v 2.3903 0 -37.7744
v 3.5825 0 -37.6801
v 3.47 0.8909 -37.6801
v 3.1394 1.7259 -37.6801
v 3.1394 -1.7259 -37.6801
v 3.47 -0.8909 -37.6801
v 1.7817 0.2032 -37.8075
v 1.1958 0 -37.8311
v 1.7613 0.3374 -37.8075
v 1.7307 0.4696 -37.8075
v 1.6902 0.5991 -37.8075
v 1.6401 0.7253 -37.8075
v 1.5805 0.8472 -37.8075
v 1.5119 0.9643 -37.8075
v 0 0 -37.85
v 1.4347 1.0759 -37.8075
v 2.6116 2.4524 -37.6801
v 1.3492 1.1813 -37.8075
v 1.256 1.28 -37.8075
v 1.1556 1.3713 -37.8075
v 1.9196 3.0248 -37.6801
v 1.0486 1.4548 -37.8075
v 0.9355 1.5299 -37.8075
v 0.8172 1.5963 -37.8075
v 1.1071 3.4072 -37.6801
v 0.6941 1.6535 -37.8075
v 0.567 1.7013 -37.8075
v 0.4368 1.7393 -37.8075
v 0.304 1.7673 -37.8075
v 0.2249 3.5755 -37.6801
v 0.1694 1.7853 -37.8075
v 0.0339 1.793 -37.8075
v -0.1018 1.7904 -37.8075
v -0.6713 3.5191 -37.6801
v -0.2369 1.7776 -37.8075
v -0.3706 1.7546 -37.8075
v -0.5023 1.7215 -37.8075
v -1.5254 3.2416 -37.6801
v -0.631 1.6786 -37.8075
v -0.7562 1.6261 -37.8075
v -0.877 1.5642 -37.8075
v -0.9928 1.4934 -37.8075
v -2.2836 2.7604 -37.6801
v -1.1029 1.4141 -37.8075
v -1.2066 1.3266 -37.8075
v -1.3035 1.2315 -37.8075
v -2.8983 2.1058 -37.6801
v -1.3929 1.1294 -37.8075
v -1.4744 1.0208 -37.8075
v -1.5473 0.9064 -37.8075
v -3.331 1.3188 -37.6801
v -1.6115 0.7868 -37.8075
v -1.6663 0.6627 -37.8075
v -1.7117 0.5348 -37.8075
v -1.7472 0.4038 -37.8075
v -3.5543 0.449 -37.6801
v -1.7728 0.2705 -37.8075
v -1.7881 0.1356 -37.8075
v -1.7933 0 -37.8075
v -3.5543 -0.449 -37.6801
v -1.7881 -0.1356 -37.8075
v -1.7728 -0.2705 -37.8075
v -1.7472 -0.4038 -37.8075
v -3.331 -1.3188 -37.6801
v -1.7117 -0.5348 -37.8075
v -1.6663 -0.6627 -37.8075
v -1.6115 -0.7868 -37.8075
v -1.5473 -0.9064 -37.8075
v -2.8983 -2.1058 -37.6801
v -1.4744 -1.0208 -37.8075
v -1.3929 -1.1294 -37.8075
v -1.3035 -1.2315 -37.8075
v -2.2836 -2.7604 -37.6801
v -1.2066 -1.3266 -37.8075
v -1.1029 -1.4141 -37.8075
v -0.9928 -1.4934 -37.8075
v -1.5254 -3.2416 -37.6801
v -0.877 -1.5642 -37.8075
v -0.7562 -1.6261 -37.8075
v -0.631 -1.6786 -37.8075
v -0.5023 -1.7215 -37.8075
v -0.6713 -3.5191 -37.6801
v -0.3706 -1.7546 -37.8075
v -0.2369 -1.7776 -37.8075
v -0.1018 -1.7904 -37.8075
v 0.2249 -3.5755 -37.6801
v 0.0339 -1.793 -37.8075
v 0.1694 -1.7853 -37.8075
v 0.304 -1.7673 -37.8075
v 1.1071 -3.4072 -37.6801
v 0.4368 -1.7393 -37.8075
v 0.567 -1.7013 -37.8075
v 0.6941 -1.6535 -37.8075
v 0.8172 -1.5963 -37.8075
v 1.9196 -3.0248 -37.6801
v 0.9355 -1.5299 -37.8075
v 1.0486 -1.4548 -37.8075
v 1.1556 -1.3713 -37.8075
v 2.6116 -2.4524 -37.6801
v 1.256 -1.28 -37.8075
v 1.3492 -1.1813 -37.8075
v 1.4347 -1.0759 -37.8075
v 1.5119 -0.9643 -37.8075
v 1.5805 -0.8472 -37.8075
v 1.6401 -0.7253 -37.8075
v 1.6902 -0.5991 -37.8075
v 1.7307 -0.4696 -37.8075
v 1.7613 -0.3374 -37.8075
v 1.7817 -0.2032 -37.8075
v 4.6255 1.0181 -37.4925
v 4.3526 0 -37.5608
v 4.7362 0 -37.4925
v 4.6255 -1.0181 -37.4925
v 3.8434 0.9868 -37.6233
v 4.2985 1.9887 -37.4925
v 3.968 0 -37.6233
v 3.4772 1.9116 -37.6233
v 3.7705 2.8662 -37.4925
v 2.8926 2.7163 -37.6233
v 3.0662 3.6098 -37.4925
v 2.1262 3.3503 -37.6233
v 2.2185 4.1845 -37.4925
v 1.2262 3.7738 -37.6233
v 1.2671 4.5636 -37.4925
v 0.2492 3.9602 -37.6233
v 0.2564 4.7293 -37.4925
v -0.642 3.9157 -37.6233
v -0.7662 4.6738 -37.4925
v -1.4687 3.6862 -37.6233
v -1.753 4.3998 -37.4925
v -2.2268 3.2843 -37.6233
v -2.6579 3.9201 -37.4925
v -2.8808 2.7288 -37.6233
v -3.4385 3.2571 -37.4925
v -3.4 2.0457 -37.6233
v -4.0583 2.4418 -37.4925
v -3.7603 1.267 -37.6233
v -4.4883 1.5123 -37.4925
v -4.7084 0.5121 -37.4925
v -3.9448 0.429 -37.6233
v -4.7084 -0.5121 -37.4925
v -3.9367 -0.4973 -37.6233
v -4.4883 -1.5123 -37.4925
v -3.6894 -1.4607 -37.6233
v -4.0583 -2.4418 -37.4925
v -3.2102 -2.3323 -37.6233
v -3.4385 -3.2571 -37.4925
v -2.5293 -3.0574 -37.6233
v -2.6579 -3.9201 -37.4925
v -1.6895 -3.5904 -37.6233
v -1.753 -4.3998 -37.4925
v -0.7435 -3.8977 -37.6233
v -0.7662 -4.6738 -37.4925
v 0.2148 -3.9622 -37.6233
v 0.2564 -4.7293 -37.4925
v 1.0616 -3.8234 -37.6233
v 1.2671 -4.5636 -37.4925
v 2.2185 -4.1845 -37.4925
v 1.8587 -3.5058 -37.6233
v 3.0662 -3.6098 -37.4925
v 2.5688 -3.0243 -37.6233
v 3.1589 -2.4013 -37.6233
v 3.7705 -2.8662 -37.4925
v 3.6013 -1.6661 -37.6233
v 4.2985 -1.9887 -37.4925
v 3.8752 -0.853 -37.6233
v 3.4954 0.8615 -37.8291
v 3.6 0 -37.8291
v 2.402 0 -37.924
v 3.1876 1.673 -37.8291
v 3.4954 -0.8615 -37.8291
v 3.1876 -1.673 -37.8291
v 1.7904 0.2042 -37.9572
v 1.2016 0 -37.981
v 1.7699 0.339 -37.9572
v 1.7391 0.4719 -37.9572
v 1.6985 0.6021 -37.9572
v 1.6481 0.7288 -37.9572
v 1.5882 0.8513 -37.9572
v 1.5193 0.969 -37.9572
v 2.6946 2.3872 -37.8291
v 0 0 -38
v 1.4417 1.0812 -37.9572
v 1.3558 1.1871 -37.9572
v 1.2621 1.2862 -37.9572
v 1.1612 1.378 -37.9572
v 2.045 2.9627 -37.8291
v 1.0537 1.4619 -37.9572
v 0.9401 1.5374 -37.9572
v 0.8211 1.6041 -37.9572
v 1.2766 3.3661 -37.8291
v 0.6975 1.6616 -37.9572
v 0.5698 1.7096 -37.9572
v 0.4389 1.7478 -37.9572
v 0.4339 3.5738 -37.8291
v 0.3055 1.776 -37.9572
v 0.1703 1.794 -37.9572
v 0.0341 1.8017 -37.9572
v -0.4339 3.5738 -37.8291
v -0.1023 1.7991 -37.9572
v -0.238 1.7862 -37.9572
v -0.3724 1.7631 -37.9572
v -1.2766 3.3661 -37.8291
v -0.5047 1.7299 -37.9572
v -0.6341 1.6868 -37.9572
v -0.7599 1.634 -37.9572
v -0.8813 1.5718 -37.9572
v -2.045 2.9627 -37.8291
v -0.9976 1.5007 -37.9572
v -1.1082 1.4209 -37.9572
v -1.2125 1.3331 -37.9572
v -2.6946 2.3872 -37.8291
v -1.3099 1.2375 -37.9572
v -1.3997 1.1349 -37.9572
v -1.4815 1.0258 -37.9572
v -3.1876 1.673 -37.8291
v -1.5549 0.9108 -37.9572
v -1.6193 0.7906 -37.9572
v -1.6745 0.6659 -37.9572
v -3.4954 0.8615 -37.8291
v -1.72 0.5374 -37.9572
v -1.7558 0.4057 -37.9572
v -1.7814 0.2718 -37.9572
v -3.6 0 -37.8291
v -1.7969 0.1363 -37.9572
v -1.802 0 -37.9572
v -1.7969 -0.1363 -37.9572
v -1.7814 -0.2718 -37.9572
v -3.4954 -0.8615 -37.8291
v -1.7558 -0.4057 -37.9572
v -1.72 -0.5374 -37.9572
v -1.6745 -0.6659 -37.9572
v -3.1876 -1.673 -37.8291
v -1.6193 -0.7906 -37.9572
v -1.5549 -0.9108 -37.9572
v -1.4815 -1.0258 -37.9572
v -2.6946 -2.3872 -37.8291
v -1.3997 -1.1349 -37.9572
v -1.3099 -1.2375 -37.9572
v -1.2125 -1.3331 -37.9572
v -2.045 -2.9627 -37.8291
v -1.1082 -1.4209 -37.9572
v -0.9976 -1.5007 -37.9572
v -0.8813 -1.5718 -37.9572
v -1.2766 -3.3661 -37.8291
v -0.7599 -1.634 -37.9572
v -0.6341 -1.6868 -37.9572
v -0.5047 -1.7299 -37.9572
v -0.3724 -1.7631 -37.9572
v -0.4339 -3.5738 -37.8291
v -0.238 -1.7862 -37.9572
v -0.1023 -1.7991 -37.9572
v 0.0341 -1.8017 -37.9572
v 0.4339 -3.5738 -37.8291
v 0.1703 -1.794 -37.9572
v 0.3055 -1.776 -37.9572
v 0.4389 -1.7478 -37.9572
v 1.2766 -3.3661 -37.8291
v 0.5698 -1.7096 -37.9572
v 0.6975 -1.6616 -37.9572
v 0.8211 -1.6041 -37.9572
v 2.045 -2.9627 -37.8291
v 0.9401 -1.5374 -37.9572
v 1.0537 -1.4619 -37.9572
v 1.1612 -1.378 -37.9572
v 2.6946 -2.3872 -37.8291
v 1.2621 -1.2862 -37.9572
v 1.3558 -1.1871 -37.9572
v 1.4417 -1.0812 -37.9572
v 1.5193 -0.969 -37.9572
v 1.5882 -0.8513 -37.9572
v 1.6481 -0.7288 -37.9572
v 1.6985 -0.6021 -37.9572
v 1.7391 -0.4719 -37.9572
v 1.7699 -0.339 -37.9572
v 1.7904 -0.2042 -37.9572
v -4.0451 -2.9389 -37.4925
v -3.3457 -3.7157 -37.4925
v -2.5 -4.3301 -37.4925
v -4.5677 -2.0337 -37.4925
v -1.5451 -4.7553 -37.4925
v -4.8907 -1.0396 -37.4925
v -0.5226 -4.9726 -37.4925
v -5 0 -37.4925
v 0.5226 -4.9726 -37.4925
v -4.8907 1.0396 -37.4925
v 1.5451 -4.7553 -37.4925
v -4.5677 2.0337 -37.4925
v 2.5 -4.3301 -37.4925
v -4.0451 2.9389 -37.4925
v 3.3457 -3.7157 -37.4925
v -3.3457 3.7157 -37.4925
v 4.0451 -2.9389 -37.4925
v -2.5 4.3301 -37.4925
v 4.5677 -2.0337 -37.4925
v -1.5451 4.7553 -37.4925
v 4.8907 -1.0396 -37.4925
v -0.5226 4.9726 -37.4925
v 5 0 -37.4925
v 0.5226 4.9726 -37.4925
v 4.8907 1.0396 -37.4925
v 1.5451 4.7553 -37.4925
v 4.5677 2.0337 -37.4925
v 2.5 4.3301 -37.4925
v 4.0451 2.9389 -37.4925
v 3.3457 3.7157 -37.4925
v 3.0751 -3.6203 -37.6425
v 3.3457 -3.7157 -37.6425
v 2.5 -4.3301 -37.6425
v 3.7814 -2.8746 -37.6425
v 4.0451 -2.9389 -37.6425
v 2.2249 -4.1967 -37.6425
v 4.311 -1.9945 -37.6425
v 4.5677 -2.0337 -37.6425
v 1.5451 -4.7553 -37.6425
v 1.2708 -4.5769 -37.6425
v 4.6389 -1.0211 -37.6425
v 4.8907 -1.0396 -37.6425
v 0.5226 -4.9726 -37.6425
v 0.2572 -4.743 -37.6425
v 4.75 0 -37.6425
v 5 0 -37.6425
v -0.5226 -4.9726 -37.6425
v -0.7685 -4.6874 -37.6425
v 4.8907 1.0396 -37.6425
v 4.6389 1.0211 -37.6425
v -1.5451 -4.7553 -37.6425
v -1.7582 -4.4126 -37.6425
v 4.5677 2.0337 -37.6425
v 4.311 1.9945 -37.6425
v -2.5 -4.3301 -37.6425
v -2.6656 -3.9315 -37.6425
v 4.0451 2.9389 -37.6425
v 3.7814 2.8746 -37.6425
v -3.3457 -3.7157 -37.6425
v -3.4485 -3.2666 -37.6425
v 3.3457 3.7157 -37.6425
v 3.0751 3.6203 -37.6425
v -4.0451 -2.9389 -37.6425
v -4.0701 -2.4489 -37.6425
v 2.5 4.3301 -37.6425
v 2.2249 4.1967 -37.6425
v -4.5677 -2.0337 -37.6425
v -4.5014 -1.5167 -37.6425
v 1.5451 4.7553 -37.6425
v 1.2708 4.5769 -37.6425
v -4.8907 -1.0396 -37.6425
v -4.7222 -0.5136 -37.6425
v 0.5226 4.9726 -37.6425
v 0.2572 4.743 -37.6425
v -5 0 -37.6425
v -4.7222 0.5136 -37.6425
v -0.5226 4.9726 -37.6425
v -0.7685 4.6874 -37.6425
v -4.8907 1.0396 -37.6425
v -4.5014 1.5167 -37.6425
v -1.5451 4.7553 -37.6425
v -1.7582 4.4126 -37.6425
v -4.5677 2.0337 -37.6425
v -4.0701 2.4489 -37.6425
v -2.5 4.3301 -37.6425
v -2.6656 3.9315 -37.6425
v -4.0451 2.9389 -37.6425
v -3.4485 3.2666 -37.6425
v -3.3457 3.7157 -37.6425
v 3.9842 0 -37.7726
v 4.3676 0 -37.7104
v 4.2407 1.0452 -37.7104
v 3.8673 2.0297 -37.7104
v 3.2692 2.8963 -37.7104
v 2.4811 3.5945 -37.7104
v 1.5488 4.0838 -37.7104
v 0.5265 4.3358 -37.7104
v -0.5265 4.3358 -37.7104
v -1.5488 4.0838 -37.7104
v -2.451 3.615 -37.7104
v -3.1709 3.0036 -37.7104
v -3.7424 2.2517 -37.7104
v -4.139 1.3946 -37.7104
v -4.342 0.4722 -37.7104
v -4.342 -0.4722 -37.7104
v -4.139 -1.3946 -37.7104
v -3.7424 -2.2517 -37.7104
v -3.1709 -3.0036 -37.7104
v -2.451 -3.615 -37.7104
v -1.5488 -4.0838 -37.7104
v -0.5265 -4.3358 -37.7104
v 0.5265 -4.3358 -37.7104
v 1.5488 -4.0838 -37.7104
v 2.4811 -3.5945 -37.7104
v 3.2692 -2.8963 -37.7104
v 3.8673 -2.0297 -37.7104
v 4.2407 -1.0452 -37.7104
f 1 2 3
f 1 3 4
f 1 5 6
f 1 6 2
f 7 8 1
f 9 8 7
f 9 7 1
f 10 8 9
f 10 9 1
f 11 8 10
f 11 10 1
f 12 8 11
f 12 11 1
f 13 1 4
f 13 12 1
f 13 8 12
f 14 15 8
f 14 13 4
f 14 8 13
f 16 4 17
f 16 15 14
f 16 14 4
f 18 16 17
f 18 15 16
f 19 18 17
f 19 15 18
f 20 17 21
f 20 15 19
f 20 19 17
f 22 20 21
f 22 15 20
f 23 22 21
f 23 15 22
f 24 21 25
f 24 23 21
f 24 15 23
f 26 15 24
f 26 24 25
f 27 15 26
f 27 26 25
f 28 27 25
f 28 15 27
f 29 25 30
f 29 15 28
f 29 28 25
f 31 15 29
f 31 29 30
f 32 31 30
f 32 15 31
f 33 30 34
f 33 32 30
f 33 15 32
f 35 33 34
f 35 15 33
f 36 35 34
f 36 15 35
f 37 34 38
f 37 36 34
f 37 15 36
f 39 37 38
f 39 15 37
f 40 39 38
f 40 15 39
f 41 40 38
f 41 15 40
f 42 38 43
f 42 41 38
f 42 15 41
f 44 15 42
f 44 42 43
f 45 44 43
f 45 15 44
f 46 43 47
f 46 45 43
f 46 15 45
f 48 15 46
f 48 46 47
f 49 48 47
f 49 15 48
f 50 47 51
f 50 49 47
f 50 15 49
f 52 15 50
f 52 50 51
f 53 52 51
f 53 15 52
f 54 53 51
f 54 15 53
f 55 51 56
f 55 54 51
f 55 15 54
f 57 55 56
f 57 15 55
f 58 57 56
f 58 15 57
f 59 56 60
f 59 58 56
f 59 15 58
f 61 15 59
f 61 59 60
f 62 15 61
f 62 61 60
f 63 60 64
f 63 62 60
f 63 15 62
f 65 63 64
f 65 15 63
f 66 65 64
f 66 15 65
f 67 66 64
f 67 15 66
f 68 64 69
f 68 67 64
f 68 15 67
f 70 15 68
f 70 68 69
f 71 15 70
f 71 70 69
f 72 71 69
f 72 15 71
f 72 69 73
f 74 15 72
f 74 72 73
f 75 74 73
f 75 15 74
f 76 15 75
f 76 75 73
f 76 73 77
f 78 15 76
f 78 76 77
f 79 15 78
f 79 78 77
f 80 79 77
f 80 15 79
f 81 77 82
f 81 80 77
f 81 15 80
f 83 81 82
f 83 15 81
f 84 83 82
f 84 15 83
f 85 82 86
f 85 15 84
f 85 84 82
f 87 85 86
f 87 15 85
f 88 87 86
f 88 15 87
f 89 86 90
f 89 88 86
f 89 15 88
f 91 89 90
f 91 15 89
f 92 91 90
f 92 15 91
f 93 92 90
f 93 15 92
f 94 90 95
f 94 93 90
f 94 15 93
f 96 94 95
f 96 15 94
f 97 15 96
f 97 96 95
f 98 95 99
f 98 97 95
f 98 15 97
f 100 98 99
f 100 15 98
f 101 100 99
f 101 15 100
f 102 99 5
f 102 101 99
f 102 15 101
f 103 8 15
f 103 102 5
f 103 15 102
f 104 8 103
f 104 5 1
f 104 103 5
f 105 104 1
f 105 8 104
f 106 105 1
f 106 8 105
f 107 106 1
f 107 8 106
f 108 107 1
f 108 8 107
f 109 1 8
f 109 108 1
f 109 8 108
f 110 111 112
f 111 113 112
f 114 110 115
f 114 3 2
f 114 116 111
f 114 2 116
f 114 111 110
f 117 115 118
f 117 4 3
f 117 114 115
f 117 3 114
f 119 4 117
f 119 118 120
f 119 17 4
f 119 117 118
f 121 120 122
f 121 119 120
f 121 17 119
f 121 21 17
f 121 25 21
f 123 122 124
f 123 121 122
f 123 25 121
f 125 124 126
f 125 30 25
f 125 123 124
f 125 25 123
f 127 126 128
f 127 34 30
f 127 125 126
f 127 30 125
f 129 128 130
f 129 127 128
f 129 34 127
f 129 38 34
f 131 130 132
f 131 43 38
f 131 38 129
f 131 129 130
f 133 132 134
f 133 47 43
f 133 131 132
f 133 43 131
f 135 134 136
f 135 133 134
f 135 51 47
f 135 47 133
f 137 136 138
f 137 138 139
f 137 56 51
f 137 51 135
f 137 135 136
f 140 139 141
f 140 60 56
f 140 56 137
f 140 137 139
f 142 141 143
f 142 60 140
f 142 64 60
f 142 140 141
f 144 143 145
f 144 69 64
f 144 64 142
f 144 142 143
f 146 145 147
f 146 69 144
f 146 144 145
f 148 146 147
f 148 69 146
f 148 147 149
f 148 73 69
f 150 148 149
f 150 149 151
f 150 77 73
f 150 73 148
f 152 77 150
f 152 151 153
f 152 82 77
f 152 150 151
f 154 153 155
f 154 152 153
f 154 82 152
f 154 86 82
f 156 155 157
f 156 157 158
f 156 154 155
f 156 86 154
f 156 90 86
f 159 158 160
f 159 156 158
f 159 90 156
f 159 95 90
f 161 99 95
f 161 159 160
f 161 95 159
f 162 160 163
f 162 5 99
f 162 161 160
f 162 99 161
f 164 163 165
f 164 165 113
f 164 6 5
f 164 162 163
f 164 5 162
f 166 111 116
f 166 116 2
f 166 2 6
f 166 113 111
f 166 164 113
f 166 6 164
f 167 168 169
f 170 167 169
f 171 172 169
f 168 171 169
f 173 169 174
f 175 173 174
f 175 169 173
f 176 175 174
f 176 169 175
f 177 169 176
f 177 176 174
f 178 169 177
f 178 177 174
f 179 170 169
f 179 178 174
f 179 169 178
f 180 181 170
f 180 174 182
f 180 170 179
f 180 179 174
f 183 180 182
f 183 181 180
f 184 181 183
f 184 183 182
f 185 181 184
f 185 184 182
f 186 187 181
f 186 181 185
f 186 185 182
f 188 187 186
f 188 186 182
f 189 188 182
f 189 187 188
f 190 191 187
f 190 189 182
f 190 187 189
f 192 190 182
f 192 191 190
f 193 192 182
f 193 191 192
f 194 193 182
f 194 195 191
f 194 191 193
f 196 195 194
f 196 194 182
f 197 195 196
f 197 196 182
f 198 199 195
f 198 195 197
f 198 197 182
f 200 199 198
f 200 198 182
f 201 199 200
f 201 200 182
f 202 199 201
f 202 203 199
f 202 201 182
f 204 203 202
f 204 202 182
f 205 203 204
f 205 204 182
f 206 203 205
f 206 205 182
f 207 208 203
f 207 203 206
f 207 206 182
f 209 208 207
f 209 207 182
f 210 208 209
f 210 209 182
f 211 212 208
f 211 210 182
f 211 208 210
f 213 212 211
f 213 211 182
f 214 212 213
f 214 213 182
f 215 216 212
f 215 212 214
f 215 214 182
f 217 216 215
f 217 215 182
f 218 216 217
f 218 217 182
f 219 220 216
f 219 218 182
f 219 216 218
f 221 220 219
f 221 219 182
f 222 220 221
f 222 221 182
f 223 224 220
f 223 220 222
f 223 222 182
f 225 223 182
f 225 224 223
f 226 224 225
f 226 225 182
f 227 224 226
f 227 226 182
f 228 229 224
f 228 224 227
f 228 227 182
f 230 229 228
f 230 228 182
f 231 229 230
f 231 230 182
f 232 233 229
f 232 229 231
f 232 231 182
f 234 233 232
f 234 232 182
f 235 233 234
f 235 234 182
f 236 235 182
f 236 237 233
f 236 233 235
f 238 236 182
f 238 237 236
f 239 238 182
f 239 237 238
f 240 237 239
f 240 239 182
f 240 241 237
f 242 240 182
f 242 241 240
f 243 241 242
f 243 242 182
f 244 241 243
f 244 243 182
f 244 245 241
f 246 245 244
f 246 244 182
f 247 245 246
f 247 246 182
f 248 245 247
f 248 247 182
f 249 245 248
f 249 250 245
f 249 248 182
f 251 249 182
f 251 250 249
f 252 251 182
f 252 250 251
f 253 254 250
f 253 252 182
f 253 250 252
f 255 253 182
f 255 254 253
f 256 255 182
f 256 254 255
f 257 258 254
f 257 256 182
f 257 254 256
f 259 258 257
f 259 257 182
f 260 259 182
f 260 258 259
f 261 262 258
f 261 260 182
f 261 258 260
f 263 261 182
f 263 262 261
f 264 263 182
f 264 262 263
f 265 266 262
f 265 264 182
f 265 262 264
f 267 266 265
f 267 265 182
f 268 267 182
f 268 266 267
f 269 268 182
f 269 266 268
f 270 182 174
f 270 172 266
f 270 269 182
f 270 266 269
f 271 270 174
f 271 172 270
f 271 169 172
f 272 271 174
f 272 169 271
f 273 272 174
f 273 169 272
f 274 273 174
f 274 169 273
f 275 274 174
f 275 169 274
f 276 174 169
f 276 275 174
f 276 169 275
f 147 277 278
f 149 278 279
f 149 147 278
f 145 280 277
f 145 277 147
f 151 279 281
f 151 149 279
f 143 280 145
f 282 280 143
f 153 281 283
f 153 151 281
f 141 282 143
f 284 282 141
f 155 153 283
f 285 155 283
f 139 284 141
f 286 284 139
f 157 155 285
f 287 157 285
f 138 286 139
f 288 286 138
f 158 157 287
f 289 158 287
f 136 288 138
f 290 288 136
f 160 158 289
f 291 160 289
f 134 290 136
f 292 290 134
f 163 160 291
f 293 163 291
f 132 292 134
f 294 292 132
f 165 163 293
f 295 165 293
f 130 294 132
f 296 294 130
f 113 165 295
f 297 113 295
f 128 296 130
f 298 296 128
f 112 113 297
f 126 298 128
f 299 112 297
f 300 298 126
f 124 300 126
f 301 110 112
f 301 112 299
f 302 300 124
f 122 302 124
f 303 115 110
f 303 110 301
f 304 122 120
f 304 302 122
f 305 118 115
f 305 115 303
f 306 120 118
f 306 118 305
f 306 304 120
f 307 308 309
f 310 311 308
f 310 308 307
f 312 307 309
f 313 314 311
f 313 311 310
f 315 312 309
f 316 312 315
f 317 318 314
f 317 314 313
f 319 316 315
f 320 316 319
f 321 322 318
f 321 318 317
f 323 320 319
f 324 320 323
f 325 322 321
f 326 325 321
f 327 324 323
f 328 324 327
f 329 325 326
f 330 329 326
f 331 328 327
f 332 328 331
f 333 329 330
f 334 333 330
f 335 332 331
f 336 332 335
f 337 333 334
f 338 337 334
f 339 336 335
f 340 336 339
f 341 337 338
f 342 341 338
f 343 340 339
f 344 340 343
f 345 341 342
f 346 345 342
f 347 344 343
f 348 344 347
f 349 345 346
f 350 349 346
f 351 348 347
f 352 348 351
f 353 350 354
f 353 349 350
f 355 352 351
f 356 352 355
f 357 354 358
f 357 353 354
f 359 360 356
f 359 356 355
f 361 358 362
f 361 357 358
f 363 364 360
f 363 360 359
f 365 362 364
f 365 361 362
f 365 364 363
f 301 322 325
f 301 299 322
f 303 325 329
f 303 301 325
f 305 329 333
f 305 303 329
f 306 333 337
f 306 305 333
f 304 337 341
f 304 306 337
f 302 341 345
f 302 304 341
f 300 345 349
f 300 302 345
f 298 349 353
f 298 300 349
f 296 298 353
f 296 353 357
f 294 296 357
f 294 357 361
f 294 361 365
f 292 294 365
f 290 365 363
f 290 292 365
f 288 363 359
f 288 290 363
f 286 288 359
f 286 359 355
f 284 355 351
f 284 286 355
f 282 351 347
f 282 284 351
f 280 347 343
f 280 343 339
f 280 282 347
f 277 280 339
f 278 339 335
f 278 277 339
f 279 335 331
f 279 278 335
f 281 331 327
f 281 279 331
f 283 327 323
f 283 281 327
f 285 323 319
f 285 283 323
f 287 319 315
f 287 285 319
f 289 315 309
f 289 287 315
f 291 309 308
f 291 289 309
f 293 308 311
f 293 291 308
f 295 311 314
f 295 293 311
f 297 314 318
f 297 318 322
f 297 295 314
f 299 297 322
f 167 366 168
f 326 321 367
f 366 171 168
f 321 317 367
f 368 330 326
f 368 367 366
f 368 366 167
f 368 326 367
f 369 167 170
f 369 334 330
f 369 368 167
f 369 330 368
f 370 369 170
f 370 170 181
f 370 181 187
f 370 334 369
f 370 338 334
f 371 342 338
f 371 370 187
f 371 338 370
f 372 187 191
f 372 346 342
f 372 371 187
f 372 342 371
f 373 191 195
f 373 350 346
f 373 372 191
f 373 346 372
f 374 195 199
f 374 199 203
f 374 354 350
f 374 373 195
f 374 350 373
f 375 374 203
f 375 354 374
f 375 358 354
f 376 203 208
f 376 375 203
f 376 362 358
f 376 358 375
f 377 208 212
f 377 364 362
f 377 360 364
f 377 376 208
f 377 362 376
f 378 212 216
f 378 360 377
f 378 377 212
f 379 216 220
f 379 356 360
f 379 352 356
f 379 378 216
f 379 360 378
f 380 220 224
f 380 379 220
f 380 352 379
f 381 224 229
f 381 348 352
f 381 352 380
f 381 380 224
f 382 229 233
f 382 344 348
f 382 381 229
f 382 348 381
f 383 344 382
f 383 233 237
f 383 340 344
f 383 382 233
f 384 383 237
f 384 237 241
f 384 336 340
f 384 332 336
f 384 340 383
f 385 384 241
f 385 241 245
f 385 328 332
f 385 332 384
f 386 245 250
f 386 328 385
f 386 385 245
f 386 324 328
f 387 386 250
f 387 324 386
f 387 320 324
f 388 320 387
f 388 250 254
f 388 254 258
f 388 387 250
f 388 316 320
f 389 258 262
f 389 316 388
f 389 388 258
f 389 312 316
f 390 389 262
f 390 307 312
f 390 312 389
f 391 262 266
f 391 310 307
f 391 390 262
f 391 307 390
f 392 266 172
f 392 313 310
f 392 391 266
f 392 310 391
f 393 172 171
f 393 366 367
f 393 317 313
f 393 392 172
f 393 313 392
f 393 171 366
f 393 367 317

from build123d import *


with BuildPart() as part:
    # 草图1 → 旋转5 (revolve)
    with BuildSketch(Plane(origin=(0, 0, 0), x_dir=(1, 0, 0), z_dir=(0, 1, 0))):
        with BuildLine():
            Line((4.75, 37.642530217), (5, 37.642530217))
            Line((5, 37.642530217), (5, 37.492530217))
            Line((5, 37.492530217), (4.736204208, 37.492530217))
            ThreePointArc((4.736204208, 37.492530217), (4.160424845, 37.592803525), (3.58253169, 37.680073868))
            ThreePointArc((3.58253169, 37.680073868), (1.793279691, 37.8074946), (0, 37.85))
            Line((0, 37.85), (0, 38))
            ThreePointArc((0, 38), (1.802027362, 37.957248285), (3.6, 37.829089336))
            ThreePointArc((3.6, 37.829089336), (4.176041915, 37.742232418), (4.75, 37.642530217))
        make_face()
    revolve(axis=Axis((0, 0, -22.128426055), (0, 0, 1)))


solid = part.part
